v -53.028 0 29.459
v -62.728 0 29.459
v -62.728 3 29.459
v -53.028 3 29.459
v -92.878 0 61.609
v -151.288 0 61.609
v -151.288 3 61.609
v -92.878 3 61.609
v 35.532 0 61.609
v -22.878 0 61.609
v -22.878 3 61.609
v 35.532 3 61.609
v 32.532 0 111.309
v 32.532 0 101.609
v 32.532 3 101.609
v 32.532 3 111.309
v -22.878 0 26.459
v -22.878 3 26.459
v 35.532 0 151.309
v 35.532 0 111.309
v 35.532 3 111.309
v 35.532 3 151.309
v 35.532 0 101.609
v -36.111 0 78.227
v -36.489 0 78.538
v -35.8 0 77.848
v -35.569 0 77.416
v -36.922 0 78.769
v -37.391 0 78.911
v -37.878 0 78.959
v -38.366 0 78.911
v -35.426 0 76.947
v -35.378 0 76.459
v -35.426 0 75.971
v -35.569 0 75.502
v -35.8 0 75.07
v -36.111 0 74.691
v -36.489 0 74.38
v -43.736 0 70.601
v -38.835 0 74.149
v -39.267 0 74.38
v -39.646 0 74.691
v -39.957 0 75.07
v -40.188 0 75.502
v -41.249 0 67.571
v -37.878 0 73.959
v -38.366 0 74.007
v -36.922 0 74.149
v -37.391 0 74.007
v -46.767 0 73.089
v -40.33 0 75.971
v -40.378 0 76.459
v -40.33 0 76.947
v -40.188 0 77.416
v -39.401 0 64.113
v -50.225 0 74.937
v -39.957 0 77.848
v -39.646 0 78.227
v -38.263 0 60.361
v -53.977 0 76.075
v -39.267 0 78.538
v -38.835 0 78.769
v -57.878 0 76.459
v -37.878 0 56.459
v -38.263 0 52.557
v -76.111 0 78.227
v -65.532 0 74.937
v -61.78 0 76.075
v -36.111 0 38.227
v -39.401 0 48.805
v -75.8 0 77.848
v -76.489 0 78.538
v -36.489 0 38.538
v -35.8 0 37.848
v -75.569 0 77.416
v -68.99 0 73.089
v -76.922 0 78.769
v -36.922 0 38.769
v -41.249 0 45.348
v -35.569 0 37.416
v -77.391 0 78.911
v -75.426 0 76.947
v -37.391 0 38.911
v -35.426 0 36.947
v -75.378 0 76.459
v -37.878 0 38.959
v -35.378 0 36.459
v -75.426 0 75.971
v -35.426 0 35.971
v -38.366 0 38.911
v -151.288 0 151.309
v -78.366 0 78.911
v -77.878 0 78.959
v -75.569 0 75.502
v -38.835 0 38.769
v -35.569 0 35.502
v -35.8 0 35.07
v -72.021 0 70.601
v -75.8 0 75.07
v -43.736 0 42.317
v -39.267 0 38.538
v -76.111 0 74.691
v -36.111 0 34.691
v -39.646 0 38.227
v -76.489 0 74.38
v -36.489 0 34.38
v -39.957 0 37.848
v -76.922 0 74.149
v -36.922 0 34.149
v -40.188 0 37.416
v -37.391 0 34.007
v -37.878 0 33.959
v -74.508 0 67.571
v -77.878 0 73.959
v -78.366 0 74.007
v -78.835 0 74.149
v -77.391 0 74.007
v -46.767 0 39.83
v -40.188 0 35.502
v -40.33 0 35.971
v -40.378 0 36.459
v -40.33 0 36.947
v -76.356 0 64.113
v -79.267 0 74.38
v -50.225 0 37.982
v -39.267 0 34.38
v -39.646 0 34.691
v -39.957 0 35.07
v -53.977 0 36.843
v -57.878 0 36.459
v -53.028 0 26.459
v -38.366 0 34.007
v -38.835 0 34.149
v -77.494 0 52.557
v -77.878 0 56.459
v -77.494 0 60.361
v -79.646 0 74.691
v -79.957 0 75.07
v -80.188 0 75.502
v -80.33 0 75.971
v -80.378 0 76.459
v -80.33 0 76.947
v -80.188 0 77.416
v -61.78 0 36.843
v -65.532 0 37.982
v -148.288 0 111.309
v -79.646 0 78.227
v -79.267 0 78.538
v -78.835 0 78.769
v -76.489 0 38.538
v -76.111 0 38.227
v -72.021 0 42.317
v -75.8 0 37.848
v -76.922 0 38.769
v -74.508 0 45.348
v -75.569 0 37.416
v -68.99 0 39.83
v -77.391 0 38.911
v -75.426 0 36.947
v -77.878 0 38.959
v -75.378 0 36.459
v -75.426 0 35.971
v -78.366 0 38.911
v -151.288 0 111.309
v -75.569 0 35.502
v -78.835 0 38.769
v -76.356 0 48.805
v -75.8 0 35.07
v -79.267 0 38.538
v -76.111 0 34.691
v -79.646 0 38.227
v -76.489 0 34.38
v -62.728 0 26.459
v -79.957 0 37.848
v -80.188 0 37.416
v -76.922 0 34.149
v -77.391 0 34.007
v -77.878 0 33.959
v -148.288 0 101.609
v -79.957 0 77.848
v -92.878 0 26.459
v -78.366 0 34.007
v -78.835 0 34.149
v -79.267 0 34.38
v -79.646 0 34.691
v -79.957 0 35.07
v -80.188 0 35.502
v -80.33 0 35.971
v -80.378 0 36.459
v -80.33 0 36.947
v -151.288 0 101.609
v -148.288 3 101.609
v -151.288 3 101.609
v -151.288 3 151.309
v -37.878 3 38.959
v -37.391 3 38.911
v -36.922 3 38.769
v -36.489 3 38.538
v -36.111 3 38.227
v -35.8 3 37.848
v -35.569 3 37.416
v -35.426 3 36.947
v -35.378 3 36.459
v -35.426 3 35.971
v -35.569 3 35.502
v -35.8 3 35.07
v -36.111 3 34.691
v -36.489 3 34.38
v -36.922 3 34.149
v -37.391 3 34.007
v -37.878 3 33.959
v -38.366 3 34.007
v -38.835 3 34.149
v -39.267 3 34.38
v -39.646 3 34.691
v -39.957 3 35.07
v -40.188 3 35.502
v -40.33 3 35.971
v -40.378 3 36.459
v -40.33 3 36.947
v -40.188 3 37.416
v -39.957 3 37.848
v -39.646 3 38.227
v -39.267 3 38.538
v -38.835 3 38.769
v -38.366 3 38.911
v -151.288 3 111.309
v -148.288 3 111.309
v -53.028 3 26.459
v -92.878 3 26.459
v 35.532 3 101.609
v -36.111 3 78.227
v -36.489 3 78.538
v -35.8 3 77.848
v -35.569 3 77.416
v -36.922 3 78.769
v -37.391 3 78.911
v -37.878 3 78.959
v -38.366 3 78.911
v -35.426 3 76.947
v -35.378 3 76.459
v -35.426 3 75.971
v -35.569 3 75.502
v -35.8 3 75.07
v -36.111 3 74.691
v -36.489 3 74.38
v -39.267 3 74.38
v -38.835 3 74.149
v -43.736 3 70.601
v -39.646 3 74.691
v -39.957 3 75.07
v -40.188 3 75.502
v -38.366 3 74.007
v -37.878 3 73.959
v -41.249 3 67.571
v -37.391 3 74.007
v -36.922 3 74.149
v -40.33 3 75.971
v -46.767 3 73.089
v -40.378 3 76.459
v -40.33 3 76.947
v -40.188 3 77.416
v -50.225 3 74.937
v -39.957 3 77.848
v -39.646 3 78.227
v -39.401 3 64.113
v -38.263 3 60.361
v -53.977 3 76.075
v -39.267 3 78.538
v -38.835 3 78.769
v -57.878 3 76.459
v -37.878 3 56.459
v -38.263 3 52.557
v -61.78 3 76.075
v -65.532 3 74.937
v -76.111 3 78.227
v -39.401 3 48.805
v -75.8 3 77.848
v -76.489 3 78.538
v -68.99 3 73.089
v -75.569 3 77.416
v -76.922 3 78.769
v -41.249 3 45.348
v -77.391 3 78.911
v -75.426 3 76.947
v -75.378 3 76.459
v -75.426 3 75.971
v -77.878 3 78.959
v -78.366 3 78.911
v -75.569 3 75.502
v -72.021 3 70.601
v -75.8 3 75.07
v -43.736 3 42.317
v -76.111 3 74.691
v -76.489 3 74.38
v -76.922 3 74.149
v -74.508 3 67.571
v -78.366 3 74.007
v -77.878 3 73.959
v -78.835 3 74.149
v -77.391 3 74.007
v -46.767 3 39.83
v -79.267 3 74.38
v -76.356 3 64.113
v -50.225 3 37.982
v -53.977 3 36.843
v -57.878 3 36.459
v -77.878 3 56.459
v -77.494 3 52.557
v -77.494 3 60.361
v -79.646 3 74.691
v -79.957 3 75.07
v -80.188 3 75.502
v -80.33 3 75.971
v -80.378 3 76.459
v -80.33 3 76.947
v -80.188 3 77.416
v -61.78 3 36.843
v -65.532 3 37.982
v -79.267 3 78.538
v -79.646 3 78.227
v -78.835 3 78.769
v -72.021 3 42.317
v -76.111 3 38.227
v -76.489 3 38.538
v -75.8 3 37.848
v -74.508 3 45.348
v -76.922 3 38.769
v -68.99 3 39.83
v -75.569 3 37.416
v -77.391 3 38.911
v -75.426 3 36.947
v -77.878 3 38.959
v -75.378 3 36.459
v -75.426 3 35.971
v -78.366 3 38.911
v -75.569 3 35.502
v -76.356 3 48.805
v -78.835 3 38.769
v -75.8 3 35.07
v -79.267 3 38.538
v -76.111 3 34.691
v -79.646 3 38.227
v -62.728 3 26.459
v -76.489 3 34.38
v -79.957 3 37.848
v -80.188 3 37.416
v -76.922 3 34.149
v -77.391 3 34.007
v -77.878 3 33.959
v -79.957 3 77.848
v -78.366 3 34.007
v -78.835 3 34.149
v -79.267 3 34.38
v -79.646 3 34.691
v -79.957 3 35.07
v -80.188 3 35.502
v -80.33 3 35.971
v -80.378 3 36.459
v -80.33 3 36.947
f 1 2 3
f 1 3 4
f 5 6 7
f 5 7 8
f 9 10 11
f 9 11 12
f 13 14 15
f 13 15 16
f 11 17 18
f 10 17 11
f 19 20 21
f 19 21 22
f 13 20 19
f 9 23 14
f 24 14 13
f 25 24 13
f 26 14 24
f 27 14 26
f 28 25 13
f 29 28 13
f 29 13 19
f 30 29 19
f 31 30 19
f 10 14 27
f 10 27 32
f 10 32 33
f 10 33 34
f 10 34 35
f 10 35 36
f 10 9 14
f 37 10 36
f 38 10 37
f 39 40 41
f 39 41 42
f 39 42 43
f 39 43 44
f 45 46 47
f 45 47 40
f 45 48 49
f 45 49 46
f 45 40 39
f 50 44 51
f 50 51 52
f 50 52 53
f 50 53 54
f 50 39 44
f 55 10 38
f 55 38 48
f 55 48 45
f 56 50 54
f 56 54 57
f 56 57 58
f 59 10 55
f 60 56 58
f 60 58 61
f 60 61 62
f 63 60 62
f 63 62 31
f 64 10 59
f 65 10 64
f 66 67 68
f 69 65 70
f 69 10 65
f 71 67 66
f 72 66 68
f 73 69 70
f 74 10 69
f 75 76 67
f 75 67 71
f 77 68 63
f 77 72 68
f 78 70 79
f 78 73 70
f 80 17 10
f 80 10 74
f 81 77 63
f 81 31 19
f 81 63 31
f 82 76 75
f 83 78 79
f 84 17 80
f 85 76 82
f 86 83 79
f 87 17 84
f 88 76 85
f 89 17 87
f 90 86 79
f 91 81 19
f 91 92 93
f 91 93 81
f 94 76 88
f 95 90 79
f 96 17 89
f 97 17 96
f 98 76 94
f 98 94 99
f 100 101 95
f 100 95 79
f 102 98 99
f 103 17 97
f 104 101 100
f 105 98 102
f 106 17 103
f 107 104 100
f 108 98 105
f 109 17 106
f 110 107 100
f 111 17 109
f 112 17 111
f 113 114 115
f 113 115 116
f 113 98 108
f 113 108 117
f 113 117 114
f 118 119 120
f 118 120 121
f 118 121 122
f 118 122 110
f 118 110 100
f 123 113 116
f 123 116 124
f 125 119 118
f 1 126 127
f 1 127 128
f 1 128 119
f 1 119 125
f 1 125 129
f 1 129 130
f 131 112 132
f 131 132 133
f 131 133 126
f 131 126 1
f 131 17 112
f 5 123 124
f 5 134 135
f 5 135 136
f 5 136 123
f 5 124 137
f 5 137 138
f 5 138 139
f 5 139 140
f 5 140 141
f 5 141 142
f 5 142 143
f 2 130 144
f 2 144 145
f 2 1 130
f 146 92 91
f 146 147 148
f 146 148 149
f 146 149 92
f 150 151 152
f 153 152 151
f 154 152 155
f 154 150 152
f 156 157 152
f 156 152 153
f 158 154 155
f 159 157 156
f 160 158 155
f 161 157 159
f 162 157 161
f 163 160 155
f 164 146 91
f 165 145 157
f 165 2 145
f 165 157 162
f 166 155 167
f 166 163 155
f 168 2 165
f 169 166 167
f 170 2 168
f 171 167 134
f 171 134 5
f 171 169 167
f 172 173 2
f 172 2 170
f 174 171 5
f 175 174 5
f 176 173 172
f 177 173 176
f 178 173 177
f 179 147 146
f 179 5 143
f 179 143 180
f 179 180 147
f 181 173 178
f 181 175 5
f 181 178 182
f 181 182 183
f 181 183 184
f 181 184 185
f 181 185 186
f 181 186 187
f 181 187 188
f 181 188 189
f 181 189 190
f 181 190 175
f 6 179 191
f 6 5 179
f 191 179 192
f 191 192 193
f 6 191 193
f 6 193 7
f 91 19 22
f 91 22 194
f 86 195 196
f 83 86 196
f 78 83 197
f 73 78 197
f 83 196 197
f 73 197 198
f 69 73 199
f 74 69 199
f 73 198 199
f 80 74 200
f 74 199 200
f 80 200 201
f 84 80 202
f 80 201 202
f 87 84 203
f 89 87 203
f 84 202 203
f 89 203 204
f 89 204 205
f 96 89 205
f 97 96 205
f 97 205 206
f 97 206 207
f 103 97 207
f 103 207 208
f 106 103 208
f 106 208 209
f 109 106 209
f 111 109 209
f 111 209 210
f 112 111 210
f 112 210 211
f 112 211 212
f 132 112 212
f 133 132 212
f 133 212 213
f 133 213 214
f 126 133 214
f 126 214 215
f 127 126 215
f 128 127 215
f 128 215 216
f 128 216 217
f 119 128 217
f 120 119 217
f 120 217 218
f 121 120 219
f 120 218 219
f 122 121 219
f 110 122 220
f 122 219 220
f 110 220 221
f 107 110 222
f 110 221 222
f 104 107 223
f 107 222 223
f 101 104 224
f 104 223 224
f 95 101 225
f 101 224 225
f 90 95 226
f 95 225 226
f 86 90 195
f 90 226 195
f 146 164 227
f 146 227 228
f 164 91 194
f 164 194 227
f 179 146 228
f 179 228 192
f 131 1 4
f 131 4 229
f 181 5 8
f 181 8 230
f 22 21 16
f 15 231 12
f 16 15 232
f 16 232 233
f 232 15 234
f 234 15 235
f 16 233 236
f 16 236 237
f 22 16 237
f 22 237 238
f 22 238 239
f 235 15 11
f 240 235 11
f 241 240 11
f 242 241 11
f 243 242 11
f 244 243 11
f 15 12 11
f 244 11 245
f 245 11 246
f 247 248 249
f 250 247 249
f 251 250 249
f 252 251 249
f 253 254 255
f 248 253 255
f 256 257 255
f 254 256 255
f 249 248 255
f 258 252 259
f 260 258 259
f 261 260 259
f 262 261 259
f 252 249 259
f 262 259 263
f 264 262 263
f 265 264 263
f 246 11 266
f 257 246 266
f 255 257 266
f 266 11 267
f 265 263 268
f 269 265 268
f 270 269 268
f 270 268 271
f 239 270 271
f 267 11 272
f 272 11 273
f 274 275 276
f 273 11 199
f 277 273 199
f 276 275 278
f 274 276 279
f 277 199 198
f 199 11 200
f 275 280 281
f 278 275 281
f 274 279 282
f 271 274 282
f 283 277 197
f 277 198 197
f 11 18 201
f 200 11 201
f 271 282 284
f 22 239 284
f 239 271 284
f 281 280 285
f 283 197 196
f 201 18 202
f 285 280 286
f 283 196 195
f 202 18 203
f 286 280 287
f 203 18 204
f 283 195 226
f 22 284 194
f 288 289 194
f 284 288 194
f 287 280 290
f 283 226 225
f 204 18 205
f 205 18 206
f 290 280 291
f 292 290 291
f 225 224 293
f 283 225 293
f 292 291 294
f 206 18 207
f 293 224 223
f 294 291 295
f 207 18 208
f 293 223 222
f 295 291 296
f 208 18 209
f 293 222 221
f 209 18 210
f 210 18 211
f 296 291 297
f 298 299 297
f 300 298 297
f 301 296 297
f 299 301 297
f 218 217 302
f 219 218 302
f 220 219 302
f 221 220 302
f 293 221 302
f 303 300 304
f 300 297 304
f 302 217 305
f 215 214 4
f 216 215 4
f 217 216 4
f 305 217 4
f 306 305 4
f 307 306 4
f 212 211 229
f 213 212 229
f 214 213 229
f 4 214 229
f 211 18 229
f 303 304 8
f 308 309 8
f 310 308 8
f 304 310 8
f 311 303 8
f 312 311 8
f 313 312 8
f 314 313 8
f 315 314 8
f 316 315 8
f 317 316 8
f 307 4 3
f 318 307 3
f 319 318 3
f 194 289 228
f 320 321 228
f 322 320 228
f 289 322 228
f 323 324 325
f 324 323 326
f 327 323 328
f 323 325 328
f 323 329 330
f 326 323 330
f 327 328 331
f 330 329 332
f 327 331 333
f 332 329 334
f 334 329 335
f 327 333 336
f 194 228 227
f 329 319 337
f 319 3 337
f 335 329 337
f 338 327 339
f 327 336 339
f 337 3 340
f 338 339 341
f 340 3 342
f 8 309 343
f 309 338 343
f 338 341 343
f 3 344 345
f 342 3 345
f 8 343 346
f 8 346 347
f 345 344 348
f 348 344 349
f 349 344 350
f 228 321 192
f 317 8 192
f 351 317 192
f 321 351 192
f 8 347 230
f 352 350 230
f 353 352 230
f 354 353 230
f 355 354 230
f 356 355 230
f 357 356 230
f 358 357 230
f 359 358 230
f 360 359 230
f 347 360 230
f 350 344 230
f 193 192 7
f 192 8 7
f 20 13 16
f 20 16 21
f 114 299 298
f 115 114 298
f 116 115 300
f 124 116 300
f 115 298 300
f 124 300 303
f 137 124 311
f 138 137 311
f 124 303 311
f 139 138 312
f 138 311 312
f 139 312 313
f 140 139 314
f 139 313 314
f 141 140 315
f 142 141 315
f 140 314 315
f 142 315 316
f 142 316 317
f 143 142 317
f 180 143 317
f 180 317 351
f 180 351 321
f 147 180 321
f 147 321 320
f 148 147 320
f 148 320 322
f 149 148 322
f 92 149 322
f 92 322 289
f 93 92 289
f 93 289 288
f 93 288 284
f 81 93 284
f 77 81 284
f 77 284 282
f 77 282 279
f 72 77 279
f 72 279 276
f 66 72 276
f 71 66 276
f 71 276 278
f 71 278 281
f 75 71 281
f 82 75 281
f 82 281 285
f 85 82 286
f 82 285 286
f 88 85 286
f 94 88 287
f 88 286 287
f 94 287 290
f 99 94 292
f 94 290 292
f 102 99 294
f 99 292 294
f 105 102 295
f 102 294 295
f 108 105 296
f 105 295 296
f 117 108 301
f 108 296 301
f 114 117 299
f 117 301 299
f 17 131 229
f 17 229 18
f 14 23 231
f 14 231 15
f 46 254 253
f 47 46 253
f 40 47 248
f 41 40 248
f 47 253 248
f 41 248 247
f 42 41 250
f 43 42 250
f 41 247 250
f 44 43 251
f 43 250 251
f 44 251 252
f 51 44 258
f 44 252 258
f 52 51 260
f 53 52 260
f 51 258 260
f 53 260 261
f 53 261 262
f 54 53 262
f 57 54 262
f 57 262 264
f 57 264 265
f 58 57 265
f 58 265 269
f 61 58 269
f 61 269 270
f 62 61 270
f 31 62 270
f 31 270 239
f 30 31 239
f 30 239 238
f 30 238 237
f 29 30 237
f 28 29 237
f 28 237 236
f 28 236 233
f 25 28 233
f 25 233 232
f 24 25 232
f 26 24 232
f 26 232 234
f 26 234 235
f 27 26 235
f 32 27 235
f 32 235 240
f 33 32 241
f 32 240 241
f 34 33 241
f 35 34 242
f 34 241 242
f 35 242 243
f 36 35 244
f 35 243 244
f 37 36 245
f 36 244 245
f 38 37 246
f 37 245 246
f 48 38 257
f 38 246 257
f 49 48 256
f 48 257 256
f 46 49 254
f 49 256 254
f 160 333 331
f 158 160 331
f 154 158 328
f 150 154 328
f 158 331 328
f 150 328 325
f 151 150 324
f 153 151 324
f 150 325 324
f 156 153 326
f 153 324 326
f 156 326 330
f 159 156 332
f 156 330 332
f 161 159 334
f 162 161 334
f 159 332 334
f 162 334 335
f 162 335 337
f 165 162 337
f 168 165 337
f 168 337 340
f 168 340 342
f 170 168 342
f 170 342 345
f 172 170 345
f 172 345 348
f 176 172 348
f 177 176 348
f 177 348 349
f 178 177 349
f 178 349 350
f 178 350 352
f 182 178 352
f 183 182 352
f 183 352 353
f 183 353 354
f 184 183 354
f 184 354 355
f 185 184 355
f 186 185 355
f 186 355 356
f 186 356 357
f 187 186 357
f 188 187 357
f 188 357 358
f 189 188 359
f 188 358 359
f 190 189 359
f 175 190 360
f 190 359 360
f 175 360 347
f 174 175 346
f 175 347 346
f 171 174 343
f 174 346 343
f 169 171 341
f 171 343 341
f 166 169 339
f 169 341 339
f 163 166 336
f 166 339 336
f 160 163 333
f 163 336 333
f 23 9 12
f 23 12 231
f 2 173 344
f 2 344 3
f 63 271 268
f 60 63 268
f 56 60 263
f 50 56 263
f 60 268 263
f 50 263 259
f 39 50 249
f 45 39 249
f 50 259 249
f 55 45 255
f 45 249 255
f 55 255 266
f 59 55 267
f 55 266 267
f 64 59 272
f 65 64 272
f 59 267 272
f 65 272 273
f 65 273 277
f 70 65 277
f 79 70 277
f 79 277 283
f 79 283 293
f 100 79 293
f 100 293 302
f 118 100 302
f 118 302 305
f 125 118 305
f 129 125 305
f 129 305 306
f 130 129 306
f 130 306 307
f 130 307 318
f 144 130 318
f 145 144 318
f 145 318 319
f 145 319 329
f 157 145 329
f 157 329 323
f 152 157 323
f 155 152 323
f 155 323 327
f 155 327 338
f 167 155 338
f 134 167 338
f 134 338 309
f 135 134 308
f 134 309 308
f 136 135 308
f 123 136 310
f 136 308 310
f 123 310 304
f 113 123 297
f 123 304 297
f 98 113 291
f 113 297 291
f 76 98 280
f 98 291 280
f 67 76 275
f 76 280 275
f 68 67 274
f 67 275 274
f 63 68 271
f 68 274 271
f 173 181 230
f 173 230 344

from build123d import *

# Parameters (mm, degrees)
BOSS_EXTRUDE1_DEPTH = 3
SKETCH3_R           = 2.5
SKETCH3_R_2         = 20
CUT_EXTRUDE1_DEPTH  = 10


with BuildPart() as part:
    # Sketch1 → Boss-Extrude1 (new body)
    with BuildSketch(Plane(origin=(0, 0, 0), x_dir=(1, 0, 0), z_dir=(0, 1, 0))):
        Polygon((-148.288384344, -111.309139144), (-148.288384344, -101.609139144), (-151.288384344, -101.609139144), (-151.288384344, -61.609139144), (-92.878384344, -61.609139144), (-92.878384344, -26.459139144), (-62.728384344, -26.459139144), (-62.728384344, -29.459139144), (-53.028384344, -29.459139144), (-53.028384344, -26.459139144), (-22.878384344, -26.459139144), (-22.878384344, -61.609139144), (35.531615656, -61.609139144), (35.531615656, -101.609139144), (32.531615656, -101.609139144), (32.531615656, -111.309139144), (35.531615656, -111.309139144), (35.531615656, -151.309139144), (-151.288384344, -151.309139144), (-151.288384344, -111.309139144), align=None)
    extrude(amount=BOSS_EXTRUDE1_DEPTH)

    # Sketch3 → Cut-Extrude1 (cut)
    with BuildSketch(Plane(origin=(0, 3, 0), x_dir=(1, 0, 0), z_dir=(0, 1, 0))):
        with Locations(Location((-77.878384344, -36.459139144, 0), (0, 0, 270))):
            Circle(SKETCH3_R)
        with Locations(Location((-37.878384344, -36.459139144, 0), (0, 0, 270))):
            Circle(SKETCH3_R)
        with Locations(Location((-37.878384344, -76.459139144, 0), (0, 0, 90))):
            Circle(SKETCH3_R)
        with Locations(Location((-77.878384344, -76.459139144, 0), (0, 0, 90))):
            Circle(SKETCH3_R)
        with Locations(Location((-57.878384344, -56.459139144, 0), (0, 0, 270))):
            Circle(SKETCH3_R_2)
    extrude(amount=-CUT_EXTRUDE1_DEPTH, mode=Mode.SUBTRACT)


solid = part.part
